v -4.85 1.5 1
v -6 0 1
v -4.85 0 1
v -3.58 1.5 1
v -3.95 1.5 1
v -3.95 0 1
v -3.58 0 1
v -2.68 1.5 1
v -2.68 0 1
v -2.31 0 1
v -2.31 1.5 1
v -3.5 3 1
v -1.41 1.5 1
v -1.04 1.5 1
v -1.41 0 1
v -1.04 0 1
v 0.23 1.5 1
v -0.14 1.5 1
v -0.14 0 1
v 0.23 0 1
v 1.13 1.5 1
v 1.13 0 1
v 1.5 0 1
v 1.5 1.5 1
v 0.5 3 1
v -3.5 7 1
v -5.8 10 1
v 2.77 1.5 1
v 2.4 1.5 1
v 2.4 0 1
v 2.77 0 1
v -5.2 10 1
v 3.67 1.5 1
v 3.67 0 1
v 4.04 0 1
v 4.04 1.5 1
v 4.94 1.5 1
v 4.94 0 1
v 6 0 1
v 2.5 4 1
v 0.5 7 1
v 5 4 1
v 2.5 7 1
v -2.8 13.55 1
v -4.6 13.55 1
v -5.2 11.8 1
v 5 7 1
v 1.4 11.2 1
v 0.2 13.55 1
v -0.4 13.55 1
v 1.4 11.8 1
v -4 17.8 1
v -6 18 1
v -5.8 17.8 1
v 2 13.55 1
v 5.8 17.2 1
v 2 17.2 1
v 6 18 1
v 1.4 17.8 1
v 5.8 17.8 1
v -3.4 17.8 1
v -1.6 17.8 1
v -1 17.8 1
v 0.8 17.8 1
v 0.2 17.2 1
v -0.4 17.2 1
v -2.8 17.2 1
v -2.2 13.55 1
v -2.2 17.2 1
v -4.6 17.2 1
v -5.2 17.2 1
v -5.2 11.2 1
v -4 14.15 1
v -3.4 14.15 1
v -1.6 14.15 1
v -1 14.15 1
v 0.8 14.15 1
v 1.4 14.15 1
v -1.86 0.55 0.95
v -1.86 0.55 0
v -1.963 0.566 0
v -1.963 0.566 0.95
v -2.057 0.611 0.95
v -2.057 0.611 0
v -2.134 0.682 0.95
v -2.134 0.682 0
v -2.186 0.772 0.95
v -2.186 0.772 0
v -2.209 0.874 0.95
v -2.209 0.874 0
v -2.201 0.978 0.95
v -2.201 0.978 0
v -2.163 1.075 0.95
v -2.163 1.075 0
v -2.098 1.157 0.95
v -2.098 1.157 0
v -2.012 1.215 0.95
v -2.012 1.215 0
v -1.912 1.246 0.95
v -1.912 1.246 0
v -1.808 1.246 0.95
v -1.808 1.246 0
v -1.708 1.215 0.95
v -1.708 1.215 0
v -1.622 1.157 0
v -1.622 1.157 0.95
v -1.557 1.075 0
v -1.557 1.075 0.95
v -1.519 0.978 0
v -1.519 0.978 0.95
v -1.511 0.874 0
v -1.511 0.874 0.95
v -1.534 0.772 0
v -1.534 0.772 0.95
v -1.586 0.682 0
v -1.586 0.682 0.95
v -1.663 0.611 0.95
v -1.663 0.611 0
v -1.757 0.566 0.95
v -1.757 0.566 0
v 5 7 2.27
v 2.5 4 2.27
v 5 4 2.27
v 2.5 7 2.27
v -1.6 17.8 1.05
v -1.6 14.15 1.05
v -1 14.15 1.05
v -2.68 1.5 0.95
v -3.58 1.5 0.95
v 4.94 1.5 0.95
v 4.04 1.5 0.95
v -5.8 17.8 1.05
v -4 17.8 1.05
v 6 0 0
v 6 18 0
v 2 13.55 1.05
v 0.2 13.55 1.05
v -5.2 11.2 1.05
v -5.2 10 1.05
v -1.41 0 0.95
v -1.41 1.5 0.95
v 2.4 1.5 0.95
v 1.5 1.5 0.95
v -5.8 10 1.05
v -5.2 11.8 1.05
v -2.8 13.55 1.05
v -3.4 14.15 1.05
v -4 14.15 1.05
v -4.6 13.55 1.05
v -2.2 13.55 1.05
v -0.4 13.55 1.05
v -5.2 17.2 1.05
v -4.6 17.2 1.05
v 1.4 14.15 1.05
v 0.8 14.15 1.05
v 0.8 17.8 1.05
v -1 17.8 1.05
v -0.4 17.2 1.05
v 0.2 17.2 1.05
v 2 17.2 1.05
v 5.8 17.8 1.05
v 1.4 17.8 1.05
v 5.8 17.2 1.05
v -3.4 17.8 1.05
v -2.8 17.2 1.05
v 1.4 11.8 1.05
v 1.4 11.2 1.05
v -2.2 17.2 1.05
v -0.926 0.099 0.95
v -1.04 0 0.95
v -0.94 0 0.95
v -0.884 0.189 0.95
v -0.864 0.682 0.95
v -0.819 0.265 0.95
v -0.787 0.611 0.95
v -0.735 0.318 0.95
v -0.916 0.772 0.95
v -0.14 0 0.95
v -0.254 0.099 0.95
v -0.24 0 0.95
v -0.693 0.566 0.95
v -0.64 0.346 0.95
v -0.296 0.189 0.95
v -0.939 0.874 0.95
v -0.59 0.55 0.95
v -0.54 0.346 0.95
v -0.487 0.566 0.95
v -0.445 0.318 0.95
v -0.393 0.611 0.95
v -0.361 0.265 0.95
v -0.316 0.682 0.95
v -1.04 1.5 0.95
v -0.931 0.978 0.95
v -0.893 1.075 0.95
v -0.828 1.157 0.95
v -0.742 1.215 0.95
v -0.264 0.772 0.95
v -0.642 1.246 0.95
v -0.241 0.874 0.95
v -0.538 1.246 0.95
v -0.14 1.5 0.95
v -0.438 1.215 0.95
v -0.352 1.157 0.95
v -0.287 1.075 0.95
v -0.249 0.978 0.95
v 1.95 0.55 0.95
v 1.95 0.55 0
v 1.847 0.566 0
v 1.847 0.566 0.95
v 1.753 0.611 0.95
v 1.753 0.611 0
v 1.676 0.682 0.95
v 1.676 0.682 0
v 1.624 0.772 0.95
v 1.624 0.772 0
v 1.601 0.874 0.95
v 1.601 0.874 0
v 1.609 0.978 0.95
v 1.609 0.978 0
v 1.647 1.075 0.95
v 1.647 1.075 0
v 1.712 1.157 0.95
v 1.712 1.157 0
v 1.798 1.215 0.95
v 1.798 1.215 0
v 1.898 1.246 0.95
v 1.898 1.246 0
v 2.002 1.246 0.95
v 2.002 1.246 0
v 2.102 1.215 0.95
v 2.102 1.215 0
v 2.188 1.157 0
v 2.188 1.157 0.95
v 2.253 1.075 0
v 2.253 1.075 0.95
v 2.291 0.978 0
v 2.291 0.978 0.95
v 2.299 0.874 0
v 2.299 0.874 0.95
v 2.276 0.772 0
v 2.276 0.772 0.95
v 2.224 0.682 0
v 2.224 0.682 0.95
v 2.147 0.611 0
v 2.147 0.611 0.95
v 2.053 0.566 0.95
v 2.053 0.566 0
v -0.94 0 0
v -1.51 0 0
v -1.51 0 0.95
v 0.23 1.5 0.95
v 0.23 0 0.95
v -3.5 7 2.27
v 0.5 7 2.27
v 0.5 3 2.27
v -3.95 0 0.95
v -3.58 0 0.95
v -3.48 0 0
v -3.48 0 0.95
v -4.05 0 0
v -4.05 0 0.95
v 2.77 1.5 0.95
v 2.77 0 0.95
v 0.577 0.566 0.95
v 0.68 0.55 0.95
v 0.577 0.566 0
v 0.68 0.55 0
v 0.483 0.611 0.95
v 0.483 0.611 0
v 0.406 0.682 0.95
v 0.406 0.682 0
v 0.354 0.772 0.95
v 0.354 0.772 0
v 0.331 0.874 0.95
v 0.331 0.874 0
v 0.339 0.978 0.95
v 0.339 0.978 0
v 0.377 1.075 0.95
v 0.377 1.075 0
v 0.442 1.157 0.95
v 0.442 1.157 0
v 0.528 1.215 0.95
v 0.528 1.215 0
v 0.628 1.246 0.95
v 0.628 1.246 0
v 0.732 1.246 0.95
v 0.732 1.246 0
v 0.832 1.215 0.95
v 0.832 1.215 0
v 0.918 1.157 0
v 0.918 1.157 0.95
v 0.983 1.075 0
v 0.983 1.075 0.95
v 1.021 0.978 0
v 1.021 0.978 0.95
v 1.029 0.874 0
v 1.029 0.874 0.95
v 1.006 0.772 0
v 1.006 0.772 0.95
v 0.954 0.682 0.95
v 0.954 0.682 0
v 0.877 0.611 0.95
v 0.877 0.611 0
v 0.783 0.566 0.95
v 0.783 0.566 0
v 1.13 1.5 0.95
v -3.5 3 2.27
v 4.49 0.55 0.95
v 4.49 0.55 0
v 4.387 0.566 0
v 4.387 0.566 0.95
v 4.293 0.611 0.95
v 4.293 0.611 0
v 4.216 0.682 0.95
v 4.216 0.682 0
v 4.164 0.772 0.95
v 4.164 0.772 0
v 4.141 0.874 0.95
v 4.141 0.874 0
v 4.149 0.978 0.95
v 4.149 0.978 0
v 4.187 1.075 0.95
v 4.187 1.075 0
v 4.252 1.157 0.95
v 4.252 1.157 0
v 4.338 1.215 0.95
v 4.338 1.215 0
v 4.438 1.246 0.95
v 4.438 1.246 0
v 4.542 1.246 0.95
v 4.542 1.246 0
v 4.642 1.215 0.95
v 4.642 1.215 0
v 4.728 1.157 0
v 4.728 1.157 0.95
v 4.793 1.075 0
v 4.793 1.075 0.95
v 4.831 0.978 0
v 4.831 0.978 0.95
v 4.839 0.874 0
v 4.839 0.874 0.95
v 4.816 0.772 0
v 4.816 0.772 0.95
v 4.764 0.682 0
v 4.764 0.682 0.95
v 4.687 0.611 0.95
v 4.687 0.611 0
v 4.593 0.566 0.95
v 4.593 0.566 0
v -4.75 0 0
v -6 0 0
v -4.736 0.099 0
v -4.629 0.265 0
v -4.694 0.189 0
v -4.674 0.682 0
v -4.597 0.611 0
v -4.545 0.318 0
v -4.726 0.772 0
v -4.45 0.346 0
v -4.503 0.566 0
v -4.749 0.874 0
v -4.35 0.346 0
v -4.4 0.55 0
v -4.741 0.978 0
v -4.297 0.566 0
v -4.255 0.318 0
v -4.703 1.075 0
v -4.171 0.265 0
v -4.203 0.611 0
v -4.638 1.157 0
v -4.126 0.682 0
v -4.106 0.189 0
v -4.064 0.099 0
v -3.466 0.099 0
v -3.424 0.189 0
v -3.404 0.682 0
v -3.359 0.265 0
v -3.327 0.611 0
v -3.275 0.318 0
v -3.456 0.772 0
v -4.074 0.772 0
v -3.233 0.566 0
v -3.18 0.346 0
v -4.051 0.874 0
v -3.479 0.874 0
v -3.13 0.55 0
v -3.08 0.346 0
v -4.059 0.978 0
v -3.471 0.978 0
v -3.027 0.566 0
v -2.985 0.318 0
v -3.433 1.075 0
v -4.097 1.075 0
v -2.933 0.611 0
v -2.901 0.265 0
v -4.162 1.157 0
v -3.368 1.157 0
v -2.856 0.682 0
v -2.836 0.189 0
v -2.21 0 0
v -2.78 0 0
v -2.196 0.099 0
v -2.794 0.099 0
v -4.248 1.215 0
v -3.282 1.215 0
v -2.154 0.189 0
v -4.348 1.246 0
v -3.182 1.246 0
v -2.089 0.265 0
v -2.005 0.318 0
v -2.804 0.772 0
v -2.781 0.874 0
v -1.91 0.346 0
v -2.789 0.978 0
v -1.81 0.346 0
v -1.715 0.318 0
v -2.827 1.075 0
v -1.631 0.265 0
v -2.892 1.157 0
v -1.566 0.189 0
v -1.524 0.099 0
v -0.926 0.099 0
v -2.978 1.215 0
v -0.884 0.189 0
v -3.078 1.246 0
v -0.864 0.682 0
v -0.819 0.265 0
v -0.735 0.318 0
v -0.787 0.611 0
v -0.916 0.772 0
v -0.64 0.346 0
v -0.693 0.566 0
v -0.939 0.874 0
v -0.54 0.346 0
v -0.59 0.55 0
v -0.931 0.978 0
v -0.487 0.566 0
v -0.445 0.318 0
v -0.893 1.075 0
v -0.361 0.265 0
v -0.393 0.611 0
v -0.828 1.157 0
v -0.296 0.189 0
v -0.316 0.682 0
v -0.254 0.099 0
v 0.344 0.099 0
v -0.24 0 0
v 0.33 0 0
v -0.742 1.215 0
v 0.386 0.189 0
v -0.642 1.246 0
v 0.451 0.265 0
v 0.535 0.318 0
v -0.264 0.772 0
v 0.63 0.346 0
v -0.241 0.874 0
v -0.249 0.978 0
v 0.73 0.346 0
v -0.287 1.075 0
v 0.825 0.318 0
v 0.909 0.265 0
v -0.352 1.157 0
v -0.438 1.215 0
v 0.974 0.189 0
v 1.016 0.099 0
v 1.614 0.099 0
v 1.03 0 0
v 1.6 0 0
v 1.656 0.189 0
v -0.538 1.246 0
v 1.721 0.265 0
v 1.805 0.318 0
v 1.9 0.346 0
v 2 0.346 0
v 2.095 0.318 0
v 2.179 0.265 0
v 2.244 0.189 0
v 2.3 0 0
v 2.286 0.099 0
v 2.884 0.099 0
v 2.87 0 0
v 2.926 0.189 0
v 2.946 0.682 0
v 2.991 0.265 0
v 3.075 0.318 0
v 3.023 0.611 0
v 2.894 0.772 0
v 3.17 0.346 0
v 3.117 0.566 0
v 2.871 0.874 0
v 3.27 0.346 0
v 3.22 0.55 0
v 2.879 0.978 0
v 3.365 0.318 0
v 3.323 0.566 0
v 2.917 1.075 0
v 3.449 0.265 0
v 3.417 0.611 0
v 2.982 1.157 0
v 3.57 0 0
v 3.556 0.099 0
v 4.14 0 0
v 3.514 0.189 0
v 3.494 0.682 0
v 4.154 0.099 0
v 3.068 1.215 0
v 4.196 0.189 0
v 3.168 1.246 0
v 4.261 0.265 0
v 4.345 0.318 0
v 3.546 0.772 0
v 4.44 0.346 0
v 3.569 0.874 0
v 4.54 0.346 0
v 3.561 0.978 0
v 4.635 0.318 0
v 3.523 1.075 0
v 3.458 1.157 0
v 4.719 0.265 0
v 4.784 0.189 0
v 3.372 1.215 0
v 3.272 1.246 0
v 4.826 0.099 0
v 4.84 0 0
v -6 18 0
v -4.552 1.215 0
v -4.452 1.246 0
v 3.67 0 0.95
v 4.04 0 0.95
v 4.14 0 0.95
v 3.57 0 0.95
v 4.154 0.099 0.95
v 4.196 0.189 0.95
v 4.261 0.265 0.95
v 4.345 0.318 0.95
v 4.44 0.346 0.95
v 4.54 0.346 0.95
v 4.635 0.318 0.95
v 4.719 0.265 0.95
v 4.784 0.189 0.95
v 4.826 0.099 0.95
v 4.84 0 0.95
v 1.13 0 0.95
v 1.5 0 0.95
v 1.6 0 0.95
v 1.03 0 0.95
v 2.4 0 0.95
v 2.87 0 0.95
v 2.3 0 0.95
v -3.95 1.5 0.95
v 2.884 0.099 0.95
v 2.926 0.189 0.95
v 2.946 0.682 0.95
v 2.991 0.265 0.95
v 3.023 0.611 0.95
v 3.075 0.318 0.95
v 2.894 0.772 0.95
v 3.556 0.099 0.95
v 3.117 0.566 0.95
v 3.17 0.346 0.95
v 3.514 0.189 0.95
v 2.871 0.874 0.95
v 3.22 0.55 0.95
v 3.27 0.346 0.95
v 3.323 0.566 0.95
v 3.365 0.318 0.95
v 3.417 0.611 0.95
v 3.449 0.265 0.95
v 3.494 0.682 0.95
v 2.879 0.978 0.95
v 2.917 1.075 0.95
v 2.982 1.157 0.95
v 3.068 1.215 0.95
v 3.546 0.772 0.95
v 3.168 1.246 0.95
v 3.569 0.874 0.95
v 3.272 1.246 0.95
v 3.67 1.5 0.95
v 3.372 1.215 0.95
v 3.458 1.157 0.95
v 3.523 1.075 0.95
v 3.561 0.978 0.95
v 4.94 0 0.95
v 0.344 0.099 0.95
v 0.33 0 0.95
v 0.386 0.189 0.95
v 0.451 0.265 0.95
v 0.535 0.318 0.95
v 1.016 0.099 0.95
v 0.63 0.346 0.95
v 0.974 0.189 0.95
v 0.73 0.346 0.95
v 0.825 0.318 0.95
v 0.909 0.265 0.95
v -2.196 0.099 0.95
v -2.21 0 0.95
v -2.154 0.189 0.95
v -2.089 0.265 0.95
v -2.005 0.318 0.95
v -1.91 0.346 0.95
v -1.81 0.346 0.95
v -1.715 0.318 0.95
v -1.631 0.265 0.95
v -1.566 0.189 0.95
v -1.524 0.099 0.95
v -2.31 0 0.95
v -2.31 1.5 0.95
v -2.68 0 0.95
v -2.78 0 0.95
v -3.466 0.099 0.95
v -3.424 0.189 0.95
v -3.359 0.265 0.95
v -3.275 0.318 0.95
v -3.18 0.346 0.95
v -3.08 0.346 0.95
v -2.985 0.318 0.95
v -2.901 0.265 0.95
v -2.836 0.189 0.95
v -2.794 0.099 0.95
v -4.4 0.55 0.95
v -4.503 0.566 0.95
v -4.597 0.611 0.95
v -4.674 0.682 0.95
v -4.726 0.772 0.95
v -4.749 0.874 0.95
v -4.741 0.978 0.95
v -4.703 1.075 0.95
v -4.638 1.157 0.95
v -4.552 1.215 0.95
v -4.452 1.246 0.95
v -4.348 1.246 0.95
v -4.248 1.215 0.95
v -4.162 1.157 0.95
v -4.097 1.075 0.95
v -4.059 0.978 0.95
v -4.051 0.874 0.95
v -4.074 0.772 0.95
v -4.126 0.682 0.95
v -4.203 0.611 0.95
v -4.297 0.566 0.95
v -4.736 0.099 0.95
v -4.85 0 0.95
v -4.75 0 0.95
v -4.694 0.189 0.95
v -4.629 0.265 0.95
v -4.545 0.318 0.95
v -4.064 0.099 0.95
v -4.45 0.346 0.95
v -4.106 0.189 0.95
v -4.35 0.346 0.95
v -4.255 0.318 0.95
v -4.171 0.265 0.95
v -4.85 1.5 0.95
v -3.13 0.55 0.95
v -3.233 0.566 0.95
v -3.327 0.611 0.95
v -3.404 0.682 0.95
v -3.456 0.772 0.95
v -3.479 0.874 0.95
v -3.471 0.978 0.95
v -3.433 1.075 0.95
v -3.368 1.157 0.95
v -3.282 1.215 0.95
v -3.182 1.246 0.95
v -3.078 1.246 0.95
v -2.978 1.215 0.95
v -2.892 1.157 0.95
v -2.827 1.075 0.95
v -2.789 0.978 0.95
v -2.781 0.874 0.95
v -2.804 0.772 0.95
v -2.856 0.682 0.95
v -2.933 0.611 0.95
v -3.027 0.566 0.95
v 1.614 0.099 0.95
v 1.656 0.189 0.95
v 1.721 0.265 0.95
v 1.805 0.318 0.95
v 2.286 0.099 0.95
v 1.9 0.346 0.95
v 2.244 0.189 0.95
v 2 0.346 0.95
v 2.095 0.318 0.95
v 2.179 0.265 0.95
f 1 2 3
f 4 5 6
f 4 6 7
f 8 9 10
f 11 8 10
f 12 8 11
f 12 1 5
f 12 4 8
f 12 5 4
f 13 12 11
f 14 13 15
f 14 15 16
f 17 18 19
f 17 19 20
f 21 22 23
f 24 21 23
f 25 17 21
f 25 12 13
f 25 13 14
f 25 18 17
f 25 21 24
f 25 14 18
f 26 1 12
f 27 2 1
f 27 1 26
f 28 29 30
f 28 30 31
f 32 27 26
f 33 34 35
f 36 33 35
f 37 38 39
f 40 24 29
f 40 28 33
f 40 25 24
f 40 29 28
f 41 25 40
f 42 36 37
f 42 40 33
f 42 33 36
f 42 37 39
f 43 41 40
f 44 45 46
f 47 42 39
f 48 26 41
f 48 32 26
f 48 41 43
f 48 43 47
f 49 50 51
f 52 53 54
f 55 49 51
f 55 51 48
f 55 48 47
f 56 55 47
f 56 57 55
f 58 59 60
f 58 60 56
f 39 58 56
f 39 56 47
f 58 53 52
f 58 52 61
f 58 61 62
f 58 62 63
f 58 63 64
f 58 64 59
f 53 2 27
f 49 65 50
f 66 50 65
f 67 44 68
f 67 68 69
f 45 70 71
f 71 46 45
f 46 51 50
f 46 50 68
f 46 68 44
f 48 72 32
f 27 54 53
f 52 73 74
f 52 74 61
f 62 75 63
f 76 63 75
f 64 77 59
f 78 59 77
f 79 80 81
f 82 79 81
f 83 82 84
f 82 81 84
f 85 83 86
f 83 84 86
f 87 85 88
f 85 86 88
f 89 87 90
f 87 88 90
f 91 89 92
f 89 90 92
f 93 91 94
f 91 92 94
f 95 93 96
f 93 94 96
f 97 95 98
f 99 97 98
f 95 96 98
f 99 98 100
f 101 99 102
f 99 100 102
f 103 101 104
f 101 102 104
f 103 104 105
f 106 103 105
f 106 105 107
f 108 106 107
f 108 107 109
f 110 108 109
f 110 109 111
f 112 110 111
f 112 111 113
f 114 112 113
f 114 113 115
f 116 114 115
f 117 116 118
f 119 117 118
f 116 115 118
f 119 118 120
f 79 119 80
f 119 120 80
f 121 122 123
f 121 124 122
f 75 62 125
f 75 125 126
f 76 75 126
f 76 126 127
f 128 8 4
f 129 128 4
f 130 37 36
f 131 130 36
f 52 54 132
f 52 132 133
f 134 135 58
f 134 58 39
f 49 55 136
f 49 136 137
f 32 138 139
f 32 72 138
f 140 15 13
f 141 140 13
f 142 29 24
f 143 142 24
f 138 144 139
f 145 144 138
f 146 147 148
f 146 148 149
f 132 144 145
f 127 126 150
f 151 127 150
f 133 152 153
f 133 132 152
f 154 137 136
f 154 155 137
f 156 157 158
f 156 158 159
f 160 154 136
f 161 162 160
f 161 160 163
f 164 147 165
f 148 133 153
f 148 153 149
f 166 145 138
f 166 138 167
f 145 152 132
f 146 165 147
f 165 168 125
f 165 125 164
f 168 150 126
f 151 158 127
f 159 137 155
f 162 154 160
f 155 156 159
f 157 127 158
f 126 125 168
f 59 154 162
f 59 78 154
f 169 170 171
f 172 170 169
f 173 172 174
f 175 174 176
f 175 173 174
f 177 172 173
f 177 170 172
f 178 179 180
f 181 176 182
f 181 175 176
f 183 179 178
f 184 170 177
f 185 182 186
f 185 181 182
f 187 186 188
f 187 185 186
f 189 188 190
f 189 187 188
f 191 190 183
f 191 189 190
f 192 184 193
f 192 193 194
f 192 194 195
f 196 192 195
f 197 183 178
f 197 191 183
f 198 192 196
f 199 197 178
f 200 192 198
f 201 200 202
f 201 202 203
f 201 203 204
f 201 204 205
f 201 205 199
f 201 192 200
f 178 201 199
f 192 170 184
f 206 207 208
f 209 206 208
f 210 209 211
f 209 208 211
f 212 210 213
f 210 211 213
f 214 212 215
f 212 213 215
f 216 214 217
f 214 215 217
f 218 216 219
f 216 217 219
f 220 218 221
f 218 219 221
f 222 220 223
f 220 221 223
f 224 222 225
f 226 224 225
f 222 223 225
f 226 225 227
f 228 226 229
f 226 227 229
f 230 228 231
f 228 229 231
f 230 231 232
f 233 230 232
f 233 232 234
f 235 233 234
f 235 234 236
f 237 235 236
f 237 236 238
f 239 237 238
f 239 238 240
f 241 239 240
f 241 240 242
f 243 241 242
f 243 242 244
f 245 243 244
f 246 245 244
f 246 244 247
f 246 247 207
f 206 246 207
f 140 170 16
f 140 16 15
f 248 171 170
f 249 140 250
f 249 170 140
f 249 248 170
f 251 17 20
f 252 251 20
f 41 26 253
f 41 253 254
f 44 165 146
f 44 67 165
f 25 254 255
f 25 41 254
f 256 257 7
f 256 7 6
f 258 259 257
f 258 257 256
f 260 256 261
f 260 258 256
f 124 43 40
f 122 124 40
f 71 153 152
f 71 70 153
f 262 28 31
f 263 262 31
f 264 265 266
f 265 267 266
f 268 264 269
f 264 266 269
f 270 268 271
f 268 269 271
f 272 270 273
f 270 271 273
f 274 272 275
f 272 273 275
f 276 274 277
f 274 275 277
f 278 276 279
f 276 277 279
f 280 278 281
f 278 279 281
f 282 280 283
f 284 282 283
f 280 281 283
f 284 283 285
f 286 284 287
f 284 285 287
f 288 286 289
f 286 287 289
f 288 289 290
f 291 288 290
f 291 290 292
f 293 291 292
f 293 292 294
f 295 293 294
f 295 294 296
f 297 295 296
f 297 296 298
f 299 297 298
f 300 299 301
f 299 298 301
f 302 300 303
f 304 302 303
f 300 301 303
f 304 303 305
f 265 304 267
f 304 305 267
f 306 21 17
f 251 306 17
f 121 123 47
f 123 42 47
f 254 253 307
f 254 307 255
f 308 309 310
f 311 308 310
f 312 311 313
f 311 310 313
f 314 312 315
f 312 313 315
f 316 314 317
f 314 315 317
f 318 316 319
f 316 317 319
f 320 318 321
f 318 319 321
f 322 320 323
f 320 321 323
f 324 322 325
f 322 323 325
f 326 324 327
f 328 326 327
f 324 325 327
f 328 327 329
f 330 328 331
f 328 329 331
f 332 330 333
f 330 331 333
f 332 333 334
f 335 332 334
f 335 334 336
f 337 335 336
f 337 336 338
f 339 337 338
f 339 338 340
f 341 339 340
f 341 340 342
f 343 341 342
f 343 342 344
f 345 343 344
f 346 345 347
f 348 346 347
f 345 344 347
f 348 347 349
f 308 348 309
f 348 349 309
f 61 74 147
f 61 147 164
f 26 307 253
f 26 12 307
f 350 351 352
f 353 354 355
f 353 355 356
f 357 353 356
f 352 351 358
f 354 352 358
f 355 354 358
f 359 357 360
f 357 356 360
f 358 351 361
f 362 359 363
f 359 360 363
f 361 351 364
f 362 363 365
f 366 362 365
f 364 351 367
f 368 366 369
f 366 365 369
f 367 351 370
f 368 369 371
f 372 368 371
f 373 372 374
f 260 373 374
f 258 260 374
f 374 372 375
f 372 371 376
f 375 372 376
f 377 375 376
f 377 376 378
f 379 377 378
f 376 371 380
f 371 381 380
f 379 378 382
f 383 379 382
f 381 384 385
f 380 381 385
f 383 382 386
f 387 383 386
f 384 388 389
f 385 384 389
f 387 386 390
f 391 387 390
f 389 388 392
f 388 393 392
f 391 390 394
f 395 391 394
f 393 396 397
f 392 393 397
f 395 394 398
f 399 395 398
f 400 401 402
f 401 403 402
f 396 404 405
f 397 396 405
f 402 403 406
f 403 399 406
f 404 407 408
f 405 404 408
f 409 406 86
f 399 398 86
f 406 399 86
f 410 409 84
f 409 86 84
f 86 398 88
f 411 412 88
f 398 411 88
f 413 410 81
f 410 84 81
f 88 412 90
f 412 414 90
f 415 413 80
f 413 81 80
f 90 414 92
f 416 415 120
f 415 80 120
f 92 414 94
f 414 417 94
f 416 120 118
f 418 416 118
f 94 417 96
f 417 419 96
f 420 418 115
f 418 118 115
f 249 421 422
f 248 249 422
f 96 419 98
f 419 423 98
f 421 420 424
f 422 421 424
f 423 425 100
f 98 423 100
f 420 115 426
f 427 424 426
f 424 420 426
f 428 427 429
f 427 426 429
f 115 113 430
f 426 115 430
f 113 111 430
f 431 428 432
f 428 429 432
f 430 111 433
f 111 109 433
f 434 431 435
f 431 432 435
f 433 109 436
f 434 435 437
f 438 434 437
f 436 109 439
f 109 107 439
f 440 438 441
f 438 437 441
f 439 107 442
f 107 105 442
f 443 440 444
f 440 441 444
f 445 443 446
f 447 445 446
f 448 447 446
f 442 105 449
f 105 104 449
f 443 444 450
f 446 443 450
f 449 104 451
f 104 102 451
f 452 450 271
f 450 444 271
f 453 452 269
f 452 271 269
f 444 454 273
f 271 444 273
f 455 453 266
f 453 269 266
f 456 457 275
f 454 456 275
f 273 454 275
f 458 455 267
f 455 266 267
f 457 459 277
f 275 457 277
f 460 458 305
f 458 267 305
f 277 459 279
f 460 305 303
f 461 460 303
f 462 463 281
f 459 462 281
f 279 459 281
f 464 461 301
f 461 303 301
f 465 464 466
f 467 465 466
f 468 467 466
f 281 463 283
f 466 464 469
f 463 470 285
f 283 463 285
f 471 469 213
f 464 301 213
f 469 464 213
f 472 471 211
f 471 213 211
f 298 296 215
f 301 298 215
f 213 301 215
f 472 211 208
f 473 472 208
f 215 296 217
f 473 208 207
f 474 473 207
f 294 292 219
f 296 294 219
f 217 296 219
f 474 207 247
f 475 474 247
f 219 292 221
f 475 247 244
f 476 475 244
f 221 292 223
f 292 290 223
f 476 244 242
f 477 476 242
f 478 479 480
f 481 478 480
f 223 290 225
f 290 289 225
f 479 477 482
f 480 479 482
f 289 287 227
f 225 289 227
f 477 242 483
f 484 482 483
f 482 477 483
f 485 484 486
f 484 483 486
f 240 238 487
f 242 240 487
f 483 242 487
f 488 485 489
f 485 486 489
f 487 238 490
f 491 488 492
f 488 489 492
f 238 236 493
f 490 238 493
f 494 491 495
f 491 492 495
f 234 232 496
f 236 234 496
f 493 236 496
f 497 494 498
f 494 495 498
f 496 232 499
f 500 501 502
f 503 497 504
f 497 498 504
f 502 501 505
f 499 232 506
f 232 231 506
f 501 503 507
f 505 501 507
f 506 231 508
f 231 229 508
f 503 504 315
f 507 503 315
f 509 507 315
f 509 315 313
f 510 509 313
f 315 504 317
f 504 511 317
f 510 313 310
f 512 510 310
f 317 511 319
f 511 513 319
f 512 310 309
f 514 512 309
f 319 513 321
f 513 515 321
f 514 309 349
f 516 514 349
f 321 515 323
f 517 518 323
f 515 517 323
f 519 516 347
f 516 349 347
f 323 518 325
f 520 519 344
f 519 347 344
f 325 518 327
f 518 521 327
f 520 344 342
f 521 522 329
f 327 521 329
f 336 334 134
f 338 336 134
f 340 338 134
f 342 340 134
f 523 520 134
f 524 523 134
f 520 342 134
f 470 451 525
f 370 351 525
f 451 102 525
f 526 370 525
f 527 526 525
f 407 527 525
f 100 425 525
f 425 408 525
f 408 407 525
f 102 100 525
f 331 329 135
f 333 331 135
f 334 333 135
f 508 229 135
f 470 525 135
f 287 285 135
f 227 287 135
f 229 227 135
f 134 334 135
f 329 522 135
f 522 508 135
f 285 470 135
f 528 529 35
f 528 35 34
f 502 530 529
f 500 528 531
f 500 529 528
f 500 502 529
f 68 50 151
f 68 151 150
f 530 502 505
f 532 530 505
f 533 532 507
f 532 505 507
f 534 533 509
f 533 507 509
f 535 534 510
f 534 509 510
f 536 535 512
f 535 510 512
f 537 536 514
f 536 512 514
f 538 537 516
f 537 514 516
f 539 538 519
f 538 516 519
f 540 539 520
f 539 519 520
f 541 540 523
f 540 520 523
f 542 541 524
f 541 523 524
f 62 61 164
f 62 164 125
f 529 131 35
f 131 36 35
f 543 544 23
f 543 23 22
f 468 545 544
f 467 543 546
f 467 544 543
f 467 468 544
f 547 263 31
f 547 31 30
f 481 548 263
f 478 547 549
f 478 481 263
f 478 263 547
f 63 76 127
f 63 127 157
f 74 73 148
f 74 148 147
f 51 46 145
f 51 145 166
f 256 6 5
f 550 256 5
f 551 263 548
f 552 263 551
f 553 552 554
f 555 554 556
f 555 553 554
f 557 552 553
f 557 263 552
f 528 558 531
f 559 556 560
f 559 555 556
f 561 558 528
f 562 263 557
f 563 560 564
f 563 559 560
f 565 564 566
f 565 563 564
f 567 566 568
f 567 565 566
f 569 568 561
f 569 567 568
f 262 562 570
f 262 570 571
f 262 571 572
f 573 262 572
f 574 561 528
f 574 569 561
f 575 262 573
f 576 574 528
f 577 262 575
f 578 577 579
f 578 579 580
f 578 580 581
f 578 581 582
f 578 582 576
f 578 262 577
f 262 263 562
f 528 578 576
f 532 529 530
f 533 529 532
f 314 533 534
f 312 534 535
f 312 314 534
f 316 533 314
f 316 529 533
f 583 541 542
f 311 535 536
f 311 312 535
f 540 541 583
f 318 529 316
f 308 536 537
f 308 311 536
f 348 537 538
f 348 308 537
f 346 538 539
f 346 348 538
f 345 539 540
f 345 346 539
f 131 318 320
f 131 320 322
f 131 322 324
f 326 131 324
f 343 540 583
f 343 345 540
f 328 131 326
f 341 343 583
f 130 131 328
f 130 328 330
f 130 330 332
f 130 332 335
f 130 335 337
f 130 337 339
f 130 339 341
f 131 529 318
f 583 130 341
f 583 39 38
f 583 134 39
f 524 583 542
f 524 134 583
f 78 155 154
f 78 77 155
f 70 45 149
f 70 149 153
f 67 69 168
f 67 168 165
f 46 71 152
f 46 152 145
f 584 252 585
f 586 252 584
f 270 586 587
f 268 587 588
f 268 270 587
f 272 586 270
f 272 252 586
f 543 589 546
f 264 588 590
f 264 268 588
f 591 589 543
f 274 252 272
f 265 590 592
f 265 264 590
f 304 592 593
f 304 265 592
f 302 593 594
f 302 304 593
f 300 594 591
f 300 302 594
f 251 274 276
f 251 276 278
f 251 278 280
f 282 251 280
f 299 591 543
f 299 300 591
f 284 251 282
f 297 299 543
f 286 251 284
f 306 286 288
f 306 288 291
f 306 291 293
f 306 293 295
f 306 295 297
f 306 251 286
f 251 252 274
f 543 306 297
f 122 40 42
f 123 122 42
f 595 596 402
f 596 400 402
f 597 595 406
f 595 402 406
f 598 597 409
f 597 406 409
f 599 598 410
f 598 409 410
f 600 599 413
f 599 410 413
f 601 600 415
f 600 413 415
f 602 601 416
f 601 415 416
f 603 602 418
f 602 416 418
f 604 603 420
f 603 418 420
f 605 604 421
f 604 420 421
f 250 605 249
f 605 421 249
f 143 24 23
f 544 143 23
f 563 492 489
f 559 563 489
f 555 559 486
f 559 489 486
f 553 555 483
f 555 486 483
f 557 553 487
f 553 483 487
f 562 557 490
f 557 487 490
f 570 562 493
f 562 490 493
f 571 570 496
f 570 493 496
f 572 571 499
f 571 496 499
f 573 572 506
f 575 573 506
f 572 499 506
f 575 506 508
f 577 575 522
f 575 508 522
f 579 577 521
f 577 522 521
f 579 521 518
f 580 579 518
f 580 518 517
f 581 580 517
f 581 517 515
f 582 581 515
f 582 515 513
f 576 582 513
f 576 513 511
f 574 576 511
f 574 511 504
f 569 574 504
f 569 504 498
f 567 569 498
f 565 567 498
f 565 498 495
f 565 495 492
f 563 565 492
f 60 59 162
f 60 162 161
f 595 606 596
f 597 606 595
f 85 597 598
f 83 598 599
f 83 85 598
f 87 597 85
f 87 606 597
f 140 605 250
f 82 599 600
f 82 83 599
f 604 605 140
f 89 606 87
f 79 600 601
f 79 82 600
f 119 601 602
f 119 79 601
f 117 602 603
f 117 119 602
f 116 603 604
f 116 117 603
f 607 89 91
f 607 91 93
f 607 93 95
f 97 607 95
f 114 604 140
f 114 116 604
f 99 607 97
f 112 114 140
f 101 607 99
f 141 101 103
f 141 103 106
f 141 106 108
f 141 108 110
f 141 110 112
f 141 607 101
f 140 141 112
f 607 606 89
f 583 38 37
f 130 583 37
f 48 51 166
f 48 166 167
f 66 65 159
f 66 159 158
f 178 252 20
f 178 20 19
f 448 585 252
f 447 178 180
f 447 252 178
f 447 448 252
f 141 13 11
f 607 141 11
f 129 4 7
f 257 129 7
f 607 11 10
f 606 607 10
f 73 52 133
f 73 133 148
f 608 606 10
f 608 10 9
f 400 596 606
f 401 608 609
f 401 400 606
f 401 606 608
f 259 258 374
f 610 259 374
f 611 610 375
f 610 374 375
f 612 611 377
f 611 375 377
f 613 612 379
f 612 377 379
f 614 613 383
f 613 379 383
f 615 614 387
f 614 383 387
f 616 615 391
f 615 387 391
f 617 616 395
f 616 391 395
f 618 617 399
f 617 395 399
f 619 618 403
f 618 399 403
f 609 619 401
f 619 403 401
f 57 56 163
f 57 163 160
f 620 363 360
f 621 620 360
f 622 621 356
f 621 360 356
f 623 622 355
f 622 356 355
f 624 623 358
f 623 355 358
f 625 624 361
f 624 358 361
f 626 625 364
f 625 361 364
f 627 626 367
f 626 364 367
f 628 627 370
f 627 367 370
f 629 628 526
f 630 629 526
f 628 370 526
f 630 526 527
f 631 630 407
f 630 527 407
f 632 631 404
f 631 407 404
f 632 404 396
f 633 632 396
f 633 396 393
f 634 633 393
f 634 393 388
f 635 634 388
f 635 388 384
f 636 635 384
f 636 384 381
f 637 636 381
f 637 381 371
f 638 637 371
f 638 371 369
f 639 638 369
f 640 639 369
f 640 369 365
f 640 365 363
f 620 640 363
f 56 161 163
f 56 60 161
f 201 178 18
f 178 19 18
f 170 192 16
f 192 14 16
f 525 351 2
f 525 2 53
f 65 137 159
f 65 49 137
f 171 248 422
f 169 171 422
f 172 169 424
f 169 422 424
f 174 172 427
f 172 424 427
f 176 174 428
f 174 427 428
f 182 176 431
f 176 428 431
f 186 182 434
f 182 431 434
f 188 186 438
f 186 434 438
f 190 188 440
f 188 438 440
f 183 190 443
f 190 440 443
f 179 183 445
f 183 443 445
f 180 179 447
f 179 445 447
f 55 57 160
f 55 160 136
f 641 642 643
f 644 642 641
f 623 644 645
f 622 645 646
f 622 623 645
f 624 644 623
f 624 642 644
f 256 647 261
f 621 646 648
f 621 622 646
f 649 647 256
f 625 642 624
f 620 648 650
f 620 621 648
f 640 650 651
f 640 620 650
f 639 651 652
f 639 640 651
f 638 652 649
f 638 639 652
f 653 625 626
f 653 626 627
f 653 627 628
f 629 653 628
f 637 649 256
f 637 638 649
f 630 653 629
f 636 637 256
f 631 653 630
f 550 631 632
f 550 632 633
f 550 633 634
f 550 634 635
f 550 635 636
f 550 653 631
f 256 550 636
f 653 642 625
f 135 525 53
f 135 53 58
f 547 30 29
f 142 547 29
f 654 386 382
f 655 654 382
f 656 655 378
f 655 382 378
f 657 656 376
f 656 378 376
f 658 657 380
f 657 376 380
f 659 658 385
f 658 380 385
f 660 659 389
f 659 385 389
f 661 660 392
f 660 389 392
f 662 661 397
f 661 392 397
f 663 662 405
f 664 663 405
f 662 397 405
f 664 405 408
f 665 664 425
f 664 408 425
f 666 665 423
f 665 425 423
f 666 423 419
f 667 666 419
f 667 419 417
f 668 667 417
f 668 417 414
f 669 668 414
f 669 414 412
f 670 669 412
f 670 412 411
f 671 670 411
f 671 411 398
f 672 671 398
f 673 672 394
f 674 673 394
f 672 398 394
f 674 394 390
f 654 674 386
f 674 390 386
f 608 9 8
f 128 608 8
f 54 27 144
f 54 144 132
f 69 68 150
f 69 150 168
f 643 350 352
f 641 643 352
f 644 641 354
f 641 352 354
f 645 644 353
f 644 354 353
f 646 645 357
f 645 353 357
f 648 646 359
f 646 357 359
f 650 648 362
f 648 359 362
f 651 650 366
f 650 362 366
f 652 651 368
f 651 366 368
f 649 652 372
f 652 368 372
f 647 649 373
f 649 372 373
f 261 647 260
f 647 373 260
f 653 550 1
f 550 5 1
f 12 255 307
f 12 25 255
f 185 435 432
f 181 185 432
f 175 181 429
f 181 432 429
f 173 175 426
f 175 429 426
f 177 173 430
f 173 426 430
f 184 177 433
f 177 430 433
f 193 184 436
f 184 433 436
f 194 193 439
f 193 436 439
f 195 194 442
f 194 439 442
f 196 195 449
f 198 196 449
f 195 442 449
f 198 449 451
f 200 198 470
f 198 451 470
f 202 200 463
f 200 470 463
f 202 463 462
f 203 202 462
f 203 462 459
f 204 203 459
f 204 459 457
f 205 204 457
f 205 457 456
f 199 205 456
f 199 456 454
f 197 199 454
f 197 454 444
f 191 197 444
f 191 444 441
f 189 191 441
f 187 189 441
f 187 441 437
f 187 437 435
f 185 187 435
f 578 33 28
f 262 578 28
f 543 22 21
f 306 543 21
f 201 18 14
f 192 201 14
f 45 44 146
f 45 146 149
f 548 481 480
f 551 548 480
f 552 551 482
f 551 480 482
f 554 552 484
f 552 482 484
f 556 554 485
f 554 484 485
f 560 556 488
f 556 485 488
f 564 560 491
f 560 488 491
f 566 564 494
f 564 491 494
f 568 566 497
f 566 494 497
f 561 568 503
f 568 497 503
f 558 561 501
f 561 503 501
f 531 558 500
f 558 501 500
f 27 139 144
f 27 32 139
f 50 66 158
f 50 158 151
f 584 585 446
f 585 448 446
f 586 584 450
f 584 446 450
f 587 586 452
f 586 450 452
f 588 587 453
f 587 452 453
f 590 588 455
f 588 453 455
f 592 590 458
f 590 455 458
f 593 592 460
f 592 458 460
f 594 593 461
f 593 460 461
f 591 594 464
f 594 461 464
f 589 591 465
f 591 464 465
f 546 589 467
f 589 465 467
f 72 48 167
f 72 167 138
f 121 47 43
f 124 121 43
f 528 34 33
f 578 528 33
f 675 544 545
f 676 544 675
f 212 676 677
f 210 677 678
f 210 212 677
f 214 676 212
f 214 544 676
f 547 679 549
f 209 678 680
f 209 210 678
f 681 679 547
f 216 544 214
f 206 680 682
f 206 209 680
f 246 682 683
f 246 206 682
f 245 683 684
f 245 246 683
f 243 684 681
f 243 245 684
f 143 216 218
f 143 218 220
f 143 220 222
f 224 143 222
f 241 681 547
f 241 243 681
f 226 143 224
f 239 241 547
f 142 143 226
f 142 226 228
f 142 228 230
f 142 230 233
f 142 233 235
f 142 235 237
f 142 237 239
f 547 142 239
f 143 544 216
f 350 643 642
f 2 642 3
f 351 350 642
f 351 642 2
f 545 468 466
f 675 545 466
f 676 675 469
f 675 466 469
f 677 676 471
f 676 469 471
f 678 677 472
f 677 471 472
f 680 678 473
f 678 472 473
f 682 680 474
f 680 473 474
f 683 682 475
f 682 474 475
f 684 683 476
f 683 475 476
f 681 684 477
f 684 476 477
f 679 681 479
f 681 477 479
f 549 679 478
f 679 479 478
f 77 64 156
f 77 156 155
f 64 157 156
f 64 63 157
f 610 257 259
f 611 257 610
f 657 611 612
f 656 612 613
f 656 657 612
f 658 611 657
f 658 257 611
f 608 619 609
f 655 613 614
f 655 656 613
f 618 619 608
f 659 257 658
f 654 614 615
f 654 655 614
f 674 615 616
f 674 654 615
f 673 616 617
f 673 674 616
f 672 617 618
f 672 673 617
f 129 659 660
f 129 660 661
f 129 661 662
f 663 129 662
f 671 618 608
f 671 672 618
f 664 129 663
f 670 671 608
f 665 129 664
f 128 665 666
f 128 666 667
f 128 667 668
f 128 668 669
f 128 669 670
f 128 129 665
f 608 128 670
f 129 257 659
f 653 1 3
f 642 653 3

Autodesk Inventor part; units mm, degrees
ref_plane "YZ Plane" through (0, 0, 0) normal (1, 0, 0) x (0, 1, 0)
ref_plane "XZ Plane" through (0, 0, 0) normal (0, 1, 0) x (-1, 0, 0)
ref_plane "XY Plane" through (0, 0, 0) normal (0, 0, 1) x (1, 0, 0)
sketch "Skizze1" plane through (0, 0, 0) normal (0, 0, 1) x (1, 0, 0)
  line L0 (-6, 18) -> (6, 18)
  line L1 (6, 18) -> (6, 0)
  line L2 (6, 0) -> (-6, 0)
  line L3 (-6, 0) -> (-6, 18)
  point P0 (0, 0)
  point P1 (0, 0)
  dimension "d0" = 12
  dimension "d1" = 18
extrude "Extrusion1" add sketch "Skizze1" along normal blind 1
sketch "Skizze2" plane through (0, 0, 1) normal (0, 0, 1) x (1, 0, 0)
  line L0 (-4.85, 0) -> (-3.95, 0)
  line L1 (-3.95, 0) -> (-3.95, 1.5)
  line L2 (-3.95, 1.5) -> (-4.85, 1.5)
  line L3 (-4.85, 1.5) -> (-4.85, 0)
  line L4 (-4.4, 1.5) -> (-4.4, 0) construction
  line L5 (-6, 18) -> (-6, 0) construction
  circle A0 centre (-4.4, 0.9) radius 0.35 construction
  circle A1 centre (-4.4, 0) radius 0.35 construction
  point P0 (0, 0)
  dimension "d4" = 1.6
  dimension "d5" = 0.9
  dimension "d6" = 0.7
  dimension "d7" = 0.9
  dimension "d8" = 1.5
extrude "Extrusion2" cut sketch "Skizze2" against normal blind 0.05
hole "Bohrung1" at (-4.4, 0.9, 1) at (-4.4, 0, 1) direction (0, 0, -1) diameter 0.7 end through all
pattern_linear "Rechteckige Anordnung1" count 8 spacing 1.27 along (1, 0, 0) of "Extrusion2", "Bohrung1"
sketch "Skizze3" plane through (0, 0, 1) normal (0, 0, 1) x (1, 0, 0)
  line L0 (-5.8, 10) -> (-5.8, 17.8)
  line L1 (-5.8, 17.8) -> (-4, 17.8)
  line L2 (-4, 17.8) -> (-4, 14.15)
  line L3 (-4, 14.15) -> (-3.4, 14.15)
  line L4 (-3.4, 14.15) -> (-3.4, 17.8)
  line L5 (-3.4, 17.8) -> (-1.6, 17.8)
  line L6 (-1.6, 17.8) -> (-1.6, 14.15)
  line L7 (-1.6, 14.15) -> (-1, 14.15)
  line L8 (-1, 14.15) -> (-1, 17.8)
  line L9 (-1, 17.8) -> (0.8, 17.8)
  line L10 (0.8, 17.8) -> (0.8, 14.15)
  line L11 (0.8, 14.15) -> (1.4, 14.15)
  line L12 (1.4, 14.15) -> (1.4, 17.8)
  line L13 (1.4, 17.8) -> (5.8, 17.8)
  line L14 (5.8, 17.8) -> (5.8, 17.2)
  line L15 (5.8, 17.2) -> (2, 17.2)
  line L16 (2, 17.2) -> (2, 13.55)
  line L17 (2, 13.55) -> (0.2, 13.55)
  line L18 (0.2, 13.55) -> (0.2, 17.2)
  line L19 (0.2, 17.2) -> (-0.4, 17.2)
  line L20 (-0.4, 17.2) -> (-0.4, 13.55)
  line L21 (-0.4, 13.55) -> (-2.2, 13.55)
  line L22 (-2.2, 13.55) -> (-2.2, 17.2)
  line L23 (-2.2, 17.2) -> (-2.8, 17.2)
  line L24 (-2.8, 17.2) -> (-2.8, 13.55)
  line L25 (-2.8, 13.55) -> (-4.6, 13.55)
  line L26 (-4.6, 13.55) -> (-4.6, 17.2)
  line L27 (-4.6, 17.2) -> (-5.2, 17.2)
  line L28 (-5.2, 17.2) -> (-5.2, 11.8)
  line L29 (-5.2, 11.8) -> (1.4, 11.8)
  line L30 (1.4, 11.8) -> (1.4, 11.2)
  line L31 (1.4, 11.2) -> (-5.2, 11.2)
  line L32 (-5.2, 11.2) -> (-5.2, 10)
  line L33 (-5.2, 10) -> (-5.8, 10)
  line L34 (-6, 18) -> (-6, 0) projected
  line L35 (6, 0) -> (6, 18) projected
  point P0 (0, 0)
  point P1 (1.4, 11.5)
  dimension "d21" = 0.2
  dimension "d22" = 0.2
  dimension "d23" = 0.2
  dimension "d24" = 11.5
  dimension "d25" = 0.6
  dimension "d26" = 0.6
  dimension "d27" = 0.6
  dimension "d28" = 0.6
  dimension "d29" = 0.6
  dimension "d30" = 0.6
  dimension "d31" = 4.25
  dimension "d32" = 0
  dimension "d33" = 10
extrude "Extrusion3" add sketch "Skizze3" along normal blind 0.05
sketch "Skizze4" plane through (0, 0, 1) normal (0, 0, 1) x (1, 0, 0)
  line L0 (-3.5, 7) -> (0.5, 7)
  line L1 (0.5, 7) -> (0.5, 3)
  line L2 (0.5, 3) -> (-3.5, 3)
  line L3 (-3.5, 3) -> (-3.5, 7)
  line L4 (-6, 18) -> (-6, 0) projected
  point P0 (0, 0)
  dimension "d36" = 3
  dimension "d37" = 2.5
  dimension "d38" = 4
  dimension "d39" = 4
extrude "Extrusion4" add sketch "Skizze4" along normal blind 1.27
sketch "Skizze5" plane through (0, 0, 1) normal (0, 0, 1) x (1, 0, 0)
  line L0 (5, 7) -> (2.5, 7)
  line L1 (2.5, 7) -> (2.5, 4)
  line L2 (2.5, 4) -> (5, 4)
  line L3 (5, 4) -> (5, 7)
  line L4 (6, 0) -> (6, 18) projected
  point P0 (0, 0)
  dimension "d42" = 3
  dimension "d43" = 2.5
  dimension "d44" = 4
  dimension "d45" = 1
extrude "Extrusion5" add sketch "Skizze5" along normal blind 1.27
equation "\"d11\" = d6"
equation "\"d22\" = d21"
equation "\"d23\" = d21"
equation "\"d26\" = d25"
equation "\"d27\" = d25"
equation "\"d28\" = d25"
equation "\"d29\" = d27"
equation "\"d30\" = d29"
properties part number "nRF24L01+_SMD"
